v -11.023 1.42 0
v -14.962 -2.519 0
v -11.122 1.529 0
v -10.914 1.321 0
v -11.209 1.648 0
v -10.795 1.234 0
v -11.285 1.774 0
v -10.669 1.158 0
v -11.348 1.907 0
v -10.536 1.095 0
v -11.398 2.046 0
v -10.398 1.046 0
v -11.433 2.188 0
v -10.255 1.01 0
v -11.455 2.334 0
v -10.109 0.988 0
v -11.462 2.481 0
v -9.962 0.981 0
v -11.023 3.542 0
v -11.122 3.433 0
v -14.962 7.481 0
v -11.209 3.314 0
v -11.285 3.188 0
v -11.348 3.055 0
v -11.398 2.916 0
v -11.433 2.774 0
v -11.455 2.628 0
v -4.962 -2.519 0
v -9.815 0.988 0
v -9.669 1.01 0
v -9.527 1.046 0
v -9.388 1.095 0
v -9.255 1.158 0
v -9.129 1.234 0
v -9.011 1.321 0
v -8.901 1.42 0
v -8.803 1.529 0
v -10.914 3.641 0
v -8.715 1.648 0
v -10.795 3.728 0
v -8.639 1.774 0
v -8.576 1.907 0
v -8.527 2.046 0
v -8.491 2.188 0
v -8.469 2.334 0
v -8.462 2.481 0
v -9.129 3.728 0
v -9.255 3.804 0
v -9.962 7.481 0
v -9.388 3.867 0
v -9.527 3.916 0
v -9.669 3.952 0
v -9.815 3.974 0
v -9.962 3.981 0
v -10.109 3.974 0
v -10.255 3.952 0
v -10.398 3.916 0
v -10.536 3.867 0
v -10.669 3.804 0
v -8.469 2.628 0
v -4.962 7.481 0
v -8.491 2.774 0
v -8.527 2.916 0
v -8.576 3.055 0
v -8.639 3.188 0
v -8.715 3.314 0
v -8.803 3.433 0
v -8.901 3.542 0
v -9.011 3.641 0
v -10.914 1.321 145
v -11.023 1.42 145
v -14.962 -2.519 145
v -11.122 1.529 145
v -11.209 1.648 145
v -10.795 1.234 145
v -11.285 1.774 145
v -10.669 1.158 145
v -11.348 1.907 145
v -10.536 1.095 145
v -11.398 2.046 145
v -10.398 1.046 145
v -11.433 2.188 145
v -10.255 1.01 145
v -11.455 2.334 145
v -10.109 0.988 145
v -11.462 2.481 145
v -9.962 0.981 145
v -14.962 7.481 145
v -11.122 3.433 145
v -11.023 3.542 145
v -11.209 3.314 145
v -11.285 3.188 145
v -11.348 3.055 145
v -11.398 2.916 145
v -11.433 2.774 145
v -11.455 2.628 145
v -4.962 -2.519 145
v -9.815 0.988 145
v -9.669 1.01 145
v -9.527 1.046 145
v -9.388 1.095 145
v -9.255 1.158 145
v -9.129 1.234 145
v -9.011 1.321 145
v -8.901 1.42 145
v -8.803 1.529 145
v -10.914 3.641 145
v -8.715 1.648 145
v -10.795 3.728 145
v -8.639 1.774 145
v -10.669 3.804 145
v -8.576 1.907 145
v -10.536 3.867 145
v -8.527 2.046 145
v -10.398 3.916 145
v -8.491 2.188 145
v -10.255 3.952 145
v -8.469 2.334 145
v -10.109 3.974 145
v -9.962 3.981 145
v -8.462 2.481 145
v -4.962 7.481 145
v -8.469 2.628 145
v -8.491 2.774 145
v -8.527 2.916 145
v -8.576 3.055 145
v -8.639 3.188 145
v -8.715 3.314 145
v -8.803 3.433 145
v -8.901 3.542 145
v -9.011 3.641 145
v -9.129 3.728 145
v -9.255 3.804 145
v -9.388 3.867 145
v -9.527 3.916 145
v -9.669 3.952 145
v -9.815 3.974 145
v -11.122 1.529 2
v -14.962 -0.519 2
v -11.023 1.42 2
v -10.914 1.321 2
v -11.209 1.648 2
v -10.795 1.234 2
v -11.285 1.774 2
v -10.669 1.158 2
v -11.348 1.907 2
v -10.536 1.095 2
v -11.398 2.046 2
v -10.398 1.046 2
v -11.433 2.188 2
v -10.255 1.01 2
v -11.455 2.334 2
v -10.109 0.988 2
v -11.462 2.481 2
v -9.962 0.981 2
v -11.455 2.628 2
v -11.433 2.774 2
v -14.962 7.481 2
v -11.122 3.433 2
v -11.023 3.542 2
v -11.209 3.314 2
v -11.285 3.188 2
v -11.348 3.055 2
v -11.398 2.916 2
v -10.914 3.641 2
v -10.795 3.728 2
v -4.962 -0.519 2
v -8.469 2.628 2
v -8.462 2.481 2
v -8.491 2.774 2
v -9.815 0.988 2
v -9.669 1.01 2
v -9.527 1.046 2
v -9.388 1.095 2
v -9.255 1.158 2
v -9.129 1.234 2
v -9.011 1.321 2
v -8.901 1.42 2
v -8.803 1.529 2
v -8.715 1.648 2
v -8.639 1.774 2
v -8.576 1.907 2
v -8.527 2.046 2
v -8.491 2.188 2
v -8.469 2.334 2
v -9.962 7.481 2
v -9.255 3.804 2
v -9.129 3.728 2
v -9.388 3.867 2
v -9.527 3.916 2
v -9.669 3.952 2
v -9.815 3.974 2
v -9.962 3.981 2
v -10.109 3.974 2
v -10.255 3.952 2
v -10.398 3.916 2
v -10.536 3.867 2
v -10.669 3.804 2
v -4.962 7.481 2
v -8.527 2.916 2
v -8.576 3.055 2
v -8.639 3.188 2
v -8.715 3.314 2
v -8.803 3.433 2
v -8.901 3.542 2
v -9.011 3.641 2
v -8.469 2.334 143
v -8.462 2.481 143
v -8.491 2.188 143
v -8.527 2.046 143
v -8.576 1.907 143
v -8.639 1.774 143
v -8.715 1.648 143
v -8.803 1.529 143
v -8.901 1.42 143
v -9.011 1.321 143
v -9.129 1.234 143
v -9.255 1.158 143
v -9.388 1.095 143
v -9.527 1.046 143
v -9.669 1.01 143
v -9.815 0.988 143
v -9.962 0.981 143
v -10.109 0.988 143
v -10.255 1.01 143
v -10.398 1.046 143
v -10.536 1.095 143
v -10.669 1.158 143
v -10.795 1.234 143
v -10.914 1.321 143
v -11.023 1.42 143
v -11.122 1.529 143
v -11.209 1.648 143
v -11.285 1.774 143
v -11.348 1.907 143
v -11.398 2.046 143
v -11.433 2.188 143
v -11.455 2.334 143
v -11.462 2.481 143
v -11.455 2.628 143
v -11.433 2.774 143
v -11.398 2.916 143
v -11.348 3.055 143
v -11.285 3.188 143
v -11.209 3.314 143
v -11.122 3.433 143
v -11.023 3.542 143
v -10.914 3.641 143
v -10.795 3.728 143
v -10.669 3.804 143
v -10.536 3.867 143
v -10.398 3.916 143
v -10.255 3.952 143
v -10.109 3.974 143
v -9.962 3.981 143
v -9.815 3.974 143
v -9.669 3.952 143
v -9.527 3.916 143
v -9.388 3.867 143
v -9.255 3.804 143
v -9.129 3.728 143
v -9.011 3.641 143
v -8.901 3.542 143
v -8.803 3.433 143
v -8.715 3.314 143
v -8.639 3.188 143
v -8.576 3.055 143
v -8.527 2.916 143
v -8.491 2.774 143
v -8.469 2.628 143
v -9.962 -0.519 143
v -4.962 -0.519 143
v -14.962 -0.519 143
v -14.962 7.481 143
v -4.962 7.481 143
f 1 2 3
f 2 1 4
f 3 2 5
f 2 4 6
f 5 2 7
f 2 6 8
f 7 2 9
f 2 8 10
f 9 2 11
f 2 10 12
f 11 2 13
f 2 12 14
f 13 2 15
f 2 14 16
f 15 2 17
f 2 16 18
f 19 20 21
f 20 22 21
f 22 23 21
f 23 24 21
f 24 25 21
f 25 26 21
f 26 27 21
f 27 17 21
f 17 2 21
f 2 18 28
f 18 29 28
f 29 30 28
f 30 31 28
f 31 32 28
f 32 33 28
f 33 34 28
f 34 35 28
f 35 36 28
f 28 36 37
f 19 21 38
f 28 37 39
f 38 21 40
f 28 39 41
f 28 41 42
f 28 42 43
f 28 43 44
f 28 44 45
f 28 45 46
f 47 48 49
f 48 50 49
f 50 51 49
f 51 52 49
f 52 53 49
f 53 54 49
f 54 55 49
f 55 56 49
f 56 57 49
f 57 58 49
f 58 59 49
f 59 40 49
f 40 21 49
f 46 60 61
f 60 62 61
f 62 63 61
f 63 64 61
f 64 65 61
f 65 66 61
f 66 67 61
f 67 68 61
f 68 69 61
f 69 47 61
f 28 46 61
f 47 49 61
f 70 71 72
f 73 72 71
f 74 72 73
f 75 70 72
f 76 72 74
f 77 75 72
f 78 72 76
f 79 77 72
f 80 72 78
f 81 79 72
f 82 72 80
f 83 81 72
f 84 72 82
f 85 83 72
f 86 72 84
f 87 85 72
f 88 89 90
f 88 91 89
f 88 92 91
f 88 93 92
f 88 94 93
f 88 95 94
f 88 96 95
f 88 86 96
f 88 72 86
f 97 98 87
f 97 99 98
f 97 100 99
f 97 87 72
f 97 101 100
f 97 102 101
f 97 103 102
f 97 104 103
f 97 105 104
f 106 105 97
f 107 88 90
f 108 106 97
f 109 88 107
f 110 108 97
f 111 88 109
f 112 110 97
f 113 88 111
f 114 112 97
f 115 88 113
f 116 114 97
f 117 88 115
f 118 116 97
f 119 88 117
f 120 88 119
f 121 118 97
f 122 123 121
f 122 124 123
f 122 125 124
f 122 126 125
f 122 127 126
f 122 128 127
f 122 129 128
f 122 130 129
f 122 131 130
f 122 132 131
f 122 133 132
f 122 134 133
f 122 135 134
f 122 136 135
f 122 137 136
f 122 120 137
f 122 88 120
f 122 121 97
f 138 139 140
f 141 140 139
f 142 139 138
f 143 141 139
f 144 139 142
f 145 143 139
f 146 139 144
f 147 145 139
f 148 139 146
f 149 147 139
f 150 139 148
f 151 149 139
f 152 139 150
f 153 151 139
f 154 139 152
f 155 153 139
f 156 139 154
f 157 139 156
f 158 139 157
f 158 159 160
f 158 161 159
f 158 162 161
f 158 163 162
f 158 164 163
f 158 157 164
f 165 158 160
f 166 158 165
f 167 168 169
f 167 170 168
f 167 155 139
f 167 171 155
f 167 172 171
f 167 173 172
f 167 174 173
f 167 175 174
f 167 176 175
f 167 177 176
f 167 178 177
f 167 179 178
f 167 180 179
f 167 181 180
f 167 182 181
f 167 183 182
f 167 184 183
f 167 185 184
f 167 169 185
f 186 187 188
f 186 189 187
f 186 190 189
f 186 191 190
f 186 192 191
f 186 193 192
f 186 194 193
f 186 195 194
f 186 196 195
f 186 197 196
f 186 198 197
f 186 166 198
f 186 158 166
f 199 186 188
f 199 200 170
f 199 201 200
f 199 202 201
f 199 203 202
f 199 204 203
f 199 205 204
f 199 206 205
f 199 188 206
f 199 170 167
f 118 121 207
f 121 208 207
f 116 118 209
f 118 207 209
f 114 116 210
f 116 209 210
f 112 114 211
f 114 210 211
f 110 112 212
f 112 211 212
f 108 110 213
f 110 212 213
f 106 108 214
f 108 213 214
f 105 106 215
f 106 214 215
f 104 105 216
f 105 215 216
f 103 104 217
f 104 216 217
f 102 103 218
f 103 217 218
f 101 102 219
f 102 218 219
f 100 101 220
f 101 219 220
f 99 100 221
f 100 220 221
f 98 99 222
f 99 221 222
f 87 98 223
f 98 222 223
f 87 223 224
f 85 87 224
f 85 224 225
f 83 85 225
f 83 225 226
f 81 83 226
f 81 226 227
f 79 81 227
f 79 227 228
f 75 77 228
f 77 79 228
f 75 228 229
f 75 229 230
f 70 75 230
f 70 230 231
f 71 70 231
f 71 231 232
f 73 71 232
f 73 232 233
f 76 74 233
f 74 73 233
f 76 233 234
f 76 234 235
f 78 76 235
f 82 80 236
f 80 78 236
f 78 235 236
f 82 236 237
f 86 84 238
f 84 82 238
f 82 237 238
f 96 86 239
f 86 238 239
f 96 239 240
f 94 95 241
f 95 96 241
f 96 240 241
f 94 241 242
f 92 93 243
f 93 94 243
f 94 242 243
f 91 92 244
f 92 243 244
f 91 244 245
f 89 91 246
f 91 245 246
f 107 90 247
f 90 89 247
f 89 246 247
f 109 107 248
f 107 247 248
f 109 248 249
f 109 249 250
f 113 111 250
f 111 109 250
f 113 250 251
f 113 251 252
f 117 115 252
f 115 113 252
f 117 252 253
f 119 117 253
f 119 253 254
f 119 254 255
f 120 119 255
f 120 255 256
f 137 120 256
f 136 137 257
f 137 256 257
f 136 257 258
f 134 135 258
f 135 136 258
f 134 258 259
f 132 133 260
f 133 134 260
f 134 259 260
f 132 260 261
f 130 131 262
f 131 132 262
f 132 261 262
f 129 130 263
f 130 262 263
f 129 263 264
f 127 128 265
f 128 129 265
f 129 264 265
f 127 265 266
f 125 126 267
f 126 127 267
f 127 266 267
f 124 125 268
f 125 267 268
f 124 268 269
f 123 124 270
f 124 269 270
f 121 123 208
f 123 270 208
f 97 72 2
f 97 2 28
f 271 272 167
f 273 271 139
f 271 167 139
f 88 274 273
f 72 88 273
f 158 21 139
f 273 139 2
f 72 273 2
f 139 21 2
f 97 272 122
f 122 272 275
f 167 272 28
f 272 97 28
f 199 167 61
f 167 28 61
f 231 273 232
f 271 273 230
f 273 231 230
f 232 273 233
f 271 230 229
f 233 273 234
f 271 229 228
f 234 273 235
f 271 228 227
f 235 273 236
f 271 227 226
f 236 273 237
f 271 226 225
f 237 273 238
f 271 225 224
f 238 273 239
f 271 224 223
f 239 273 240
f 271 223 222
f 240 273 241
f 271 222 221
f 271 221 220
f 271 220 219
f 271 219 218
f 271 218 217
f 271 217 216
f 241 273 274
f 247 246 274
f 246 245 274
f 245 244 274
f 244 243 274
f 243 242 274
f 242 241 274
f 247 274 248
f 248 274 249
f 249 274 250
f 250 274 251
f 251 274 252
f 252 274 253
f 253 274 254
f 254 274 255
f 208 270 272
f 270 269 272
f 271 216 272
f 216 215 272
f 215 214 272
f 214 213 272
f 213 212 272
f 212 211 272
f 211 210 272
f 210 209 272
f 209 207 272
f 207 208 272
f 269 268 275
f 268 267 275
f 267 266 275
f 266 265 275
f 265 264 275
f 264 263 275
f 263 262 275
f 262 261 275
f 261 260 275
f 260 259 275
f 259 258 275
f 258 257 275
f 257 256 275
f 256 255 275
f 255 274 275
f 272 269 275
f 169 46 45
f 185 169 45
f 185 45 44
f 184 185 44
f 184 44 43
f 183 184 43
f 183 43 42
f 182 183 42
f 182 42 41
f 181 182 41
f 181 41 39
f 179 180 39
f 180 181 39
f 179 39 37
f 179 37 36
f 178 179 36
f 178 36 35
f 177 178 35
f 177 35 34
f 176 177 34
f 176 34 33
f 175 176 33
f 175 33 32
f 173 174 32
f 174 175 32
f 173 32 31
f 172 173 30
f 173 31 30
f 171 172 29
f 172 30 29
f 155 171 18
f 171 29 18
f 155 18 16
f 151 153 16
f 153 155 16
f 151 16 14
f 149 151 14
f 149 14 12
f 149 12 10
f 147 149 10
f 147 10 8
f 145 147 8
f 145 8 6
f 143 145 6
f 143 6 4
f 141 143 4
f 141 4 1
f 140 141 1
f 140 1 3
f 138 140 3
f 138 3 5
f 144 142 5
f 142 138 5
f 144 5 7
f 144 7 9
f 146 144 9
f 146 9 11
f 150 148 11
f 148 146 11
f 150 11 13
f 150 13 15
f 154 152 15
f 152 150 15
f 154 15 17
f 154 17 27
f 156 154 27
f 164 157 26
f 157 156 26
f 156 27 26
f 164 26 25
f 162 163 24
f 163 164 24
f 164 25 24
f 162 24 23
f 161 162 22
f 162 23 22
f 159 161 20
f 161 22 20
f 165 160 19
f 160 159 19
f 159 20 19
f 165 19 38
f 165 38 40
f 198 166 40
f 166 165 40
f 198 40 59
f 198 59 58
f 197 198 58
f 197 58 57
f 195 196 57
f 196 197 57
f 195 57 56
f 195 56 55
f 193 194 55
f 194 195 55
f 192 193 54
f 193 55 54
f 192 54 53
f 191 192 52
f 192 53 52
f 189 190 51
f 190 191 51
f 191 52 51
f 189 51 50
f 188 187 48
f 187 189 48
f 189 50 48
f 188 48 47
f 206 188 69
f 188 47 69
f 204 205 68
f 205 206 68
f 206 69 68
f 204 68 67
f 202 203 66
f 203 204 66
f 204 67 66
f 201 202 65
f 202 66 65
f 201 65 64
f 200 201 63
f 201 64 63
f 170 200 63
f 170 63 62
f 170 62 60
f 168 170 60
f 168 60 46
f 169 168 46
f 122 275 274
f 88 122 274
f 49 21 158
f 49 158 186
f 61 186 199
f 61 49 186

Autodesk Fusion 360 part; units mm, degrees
sketch "Sketch1" plane through (0, 0, 0) normal (0, 0, 1) x (1, 0, 0)
  line L0 (-14.9621, 7.481) -> (-4.9621, 7.481)
  line L1 (-4.9621, 7.481) -> (-4.9621, -2.519)
  line L2 (-4.9621, -2.519) -> (-14.9621, -2.519)
  line L3 (-14.9621, -2.519) -> (-14.9621, 7.481)
  line L4 (-14.9621, 7.481) -> (-9.9621, 7.481)
  line L5 (-14.9621, 7.481) -> (-9.9621, 7.481)
  line L6 (-9.9621, 7.481) -> (-9.9621, 2.481)
  line L7 (-4.9621, 7.481) -> (-9.9621, 7.481)
  circle A0 centre (-9.9621, 2.481) radius 1.5
  dimension "d1" = 10
  dimension "d2" = 10
  dimension "d3" = 5
  dimension "d4" = 3
extrude "Extrude1" add sketch "Sketch1" along normal blind 2
sketch "Sketch2" plane through (0, 0, 2) normal (0, 0, 1) x (1, 0, 0)
  circle A0 centre (-9.9621, 2.481) radius 1.5
  line L0 (-4.9621, -2.519) -> (-4.9621, 7.481)
  line L1 (-4.9621, 7.481) -> (-14.9621, 7.481)
  line L2 (-14.9621, 7.481) -> (-14.9621, -2.519)
  line L3 (-14.9621, -2.519) -> (-4.9621, -2.519)
  line L4 (-14.9621, -2.519) -> (-4.9621, -2.519)
  line L5 (-4.9621, -2.519) -> (-4.9621, -0.519)
  line L6 (-4.9621, -0.519) -> (-14.9621, -0.519)
  line L7 (-14.9621, -0.519) -> (-14.9621, -2.519)
  dimension "d7" = 10
  dimension "d8" = 2
extrude "Extrude2" add sketch "Sketch2" along normal blind 5 contours L0 L2 L3 L4 L5 L6 L7
extrude "Extrude3" add 1 faces at (-11.6287, -1.8523, 7) along direction (0, 0, 1) blind 136
sketch "Sketch3" plane through (0, 0, 143) normal (0, 0, 1) x (1, 0, 0)
  line L0 (-14.9621, -0.519) -> (-14.9621, -2.519)
  line L1 (-14.9621, -2.519) -> (-4.9621, -2.519)
  line L2 (-4.9621, -2.519) -> (-4.9621, -0.519)
  line L3 (-4.9621, -0.519) -> (-14.9621, -0.519)
  line L4 (-14.9621, -2.519) -> (-4.9621, -2.519)
  line L5 (-4.9621, -2.519) -> (-4.9621, 7.481)
  line L6 (-4.9621, 7.481) -> (-14.9621, 7.481)
  line L7 (-14.9621, 7.481) -> (-14.9621, -2.519)
  line L8 (-14.9621, -2.519) -> (-9.9621, -2.519)
  line L9 (-9.9621, -2.519) -> (-9.9621, 2.481)
  circle A0 centre (-9.9621, 2.481) radius 1.5
  dimension "d13" = 10
  dimension "d14" = 10
  dimension "d15" = 5
  dimension "d16" = 3
extrude "Extrude4" add sketch "Sketch3" along normal blind 2
